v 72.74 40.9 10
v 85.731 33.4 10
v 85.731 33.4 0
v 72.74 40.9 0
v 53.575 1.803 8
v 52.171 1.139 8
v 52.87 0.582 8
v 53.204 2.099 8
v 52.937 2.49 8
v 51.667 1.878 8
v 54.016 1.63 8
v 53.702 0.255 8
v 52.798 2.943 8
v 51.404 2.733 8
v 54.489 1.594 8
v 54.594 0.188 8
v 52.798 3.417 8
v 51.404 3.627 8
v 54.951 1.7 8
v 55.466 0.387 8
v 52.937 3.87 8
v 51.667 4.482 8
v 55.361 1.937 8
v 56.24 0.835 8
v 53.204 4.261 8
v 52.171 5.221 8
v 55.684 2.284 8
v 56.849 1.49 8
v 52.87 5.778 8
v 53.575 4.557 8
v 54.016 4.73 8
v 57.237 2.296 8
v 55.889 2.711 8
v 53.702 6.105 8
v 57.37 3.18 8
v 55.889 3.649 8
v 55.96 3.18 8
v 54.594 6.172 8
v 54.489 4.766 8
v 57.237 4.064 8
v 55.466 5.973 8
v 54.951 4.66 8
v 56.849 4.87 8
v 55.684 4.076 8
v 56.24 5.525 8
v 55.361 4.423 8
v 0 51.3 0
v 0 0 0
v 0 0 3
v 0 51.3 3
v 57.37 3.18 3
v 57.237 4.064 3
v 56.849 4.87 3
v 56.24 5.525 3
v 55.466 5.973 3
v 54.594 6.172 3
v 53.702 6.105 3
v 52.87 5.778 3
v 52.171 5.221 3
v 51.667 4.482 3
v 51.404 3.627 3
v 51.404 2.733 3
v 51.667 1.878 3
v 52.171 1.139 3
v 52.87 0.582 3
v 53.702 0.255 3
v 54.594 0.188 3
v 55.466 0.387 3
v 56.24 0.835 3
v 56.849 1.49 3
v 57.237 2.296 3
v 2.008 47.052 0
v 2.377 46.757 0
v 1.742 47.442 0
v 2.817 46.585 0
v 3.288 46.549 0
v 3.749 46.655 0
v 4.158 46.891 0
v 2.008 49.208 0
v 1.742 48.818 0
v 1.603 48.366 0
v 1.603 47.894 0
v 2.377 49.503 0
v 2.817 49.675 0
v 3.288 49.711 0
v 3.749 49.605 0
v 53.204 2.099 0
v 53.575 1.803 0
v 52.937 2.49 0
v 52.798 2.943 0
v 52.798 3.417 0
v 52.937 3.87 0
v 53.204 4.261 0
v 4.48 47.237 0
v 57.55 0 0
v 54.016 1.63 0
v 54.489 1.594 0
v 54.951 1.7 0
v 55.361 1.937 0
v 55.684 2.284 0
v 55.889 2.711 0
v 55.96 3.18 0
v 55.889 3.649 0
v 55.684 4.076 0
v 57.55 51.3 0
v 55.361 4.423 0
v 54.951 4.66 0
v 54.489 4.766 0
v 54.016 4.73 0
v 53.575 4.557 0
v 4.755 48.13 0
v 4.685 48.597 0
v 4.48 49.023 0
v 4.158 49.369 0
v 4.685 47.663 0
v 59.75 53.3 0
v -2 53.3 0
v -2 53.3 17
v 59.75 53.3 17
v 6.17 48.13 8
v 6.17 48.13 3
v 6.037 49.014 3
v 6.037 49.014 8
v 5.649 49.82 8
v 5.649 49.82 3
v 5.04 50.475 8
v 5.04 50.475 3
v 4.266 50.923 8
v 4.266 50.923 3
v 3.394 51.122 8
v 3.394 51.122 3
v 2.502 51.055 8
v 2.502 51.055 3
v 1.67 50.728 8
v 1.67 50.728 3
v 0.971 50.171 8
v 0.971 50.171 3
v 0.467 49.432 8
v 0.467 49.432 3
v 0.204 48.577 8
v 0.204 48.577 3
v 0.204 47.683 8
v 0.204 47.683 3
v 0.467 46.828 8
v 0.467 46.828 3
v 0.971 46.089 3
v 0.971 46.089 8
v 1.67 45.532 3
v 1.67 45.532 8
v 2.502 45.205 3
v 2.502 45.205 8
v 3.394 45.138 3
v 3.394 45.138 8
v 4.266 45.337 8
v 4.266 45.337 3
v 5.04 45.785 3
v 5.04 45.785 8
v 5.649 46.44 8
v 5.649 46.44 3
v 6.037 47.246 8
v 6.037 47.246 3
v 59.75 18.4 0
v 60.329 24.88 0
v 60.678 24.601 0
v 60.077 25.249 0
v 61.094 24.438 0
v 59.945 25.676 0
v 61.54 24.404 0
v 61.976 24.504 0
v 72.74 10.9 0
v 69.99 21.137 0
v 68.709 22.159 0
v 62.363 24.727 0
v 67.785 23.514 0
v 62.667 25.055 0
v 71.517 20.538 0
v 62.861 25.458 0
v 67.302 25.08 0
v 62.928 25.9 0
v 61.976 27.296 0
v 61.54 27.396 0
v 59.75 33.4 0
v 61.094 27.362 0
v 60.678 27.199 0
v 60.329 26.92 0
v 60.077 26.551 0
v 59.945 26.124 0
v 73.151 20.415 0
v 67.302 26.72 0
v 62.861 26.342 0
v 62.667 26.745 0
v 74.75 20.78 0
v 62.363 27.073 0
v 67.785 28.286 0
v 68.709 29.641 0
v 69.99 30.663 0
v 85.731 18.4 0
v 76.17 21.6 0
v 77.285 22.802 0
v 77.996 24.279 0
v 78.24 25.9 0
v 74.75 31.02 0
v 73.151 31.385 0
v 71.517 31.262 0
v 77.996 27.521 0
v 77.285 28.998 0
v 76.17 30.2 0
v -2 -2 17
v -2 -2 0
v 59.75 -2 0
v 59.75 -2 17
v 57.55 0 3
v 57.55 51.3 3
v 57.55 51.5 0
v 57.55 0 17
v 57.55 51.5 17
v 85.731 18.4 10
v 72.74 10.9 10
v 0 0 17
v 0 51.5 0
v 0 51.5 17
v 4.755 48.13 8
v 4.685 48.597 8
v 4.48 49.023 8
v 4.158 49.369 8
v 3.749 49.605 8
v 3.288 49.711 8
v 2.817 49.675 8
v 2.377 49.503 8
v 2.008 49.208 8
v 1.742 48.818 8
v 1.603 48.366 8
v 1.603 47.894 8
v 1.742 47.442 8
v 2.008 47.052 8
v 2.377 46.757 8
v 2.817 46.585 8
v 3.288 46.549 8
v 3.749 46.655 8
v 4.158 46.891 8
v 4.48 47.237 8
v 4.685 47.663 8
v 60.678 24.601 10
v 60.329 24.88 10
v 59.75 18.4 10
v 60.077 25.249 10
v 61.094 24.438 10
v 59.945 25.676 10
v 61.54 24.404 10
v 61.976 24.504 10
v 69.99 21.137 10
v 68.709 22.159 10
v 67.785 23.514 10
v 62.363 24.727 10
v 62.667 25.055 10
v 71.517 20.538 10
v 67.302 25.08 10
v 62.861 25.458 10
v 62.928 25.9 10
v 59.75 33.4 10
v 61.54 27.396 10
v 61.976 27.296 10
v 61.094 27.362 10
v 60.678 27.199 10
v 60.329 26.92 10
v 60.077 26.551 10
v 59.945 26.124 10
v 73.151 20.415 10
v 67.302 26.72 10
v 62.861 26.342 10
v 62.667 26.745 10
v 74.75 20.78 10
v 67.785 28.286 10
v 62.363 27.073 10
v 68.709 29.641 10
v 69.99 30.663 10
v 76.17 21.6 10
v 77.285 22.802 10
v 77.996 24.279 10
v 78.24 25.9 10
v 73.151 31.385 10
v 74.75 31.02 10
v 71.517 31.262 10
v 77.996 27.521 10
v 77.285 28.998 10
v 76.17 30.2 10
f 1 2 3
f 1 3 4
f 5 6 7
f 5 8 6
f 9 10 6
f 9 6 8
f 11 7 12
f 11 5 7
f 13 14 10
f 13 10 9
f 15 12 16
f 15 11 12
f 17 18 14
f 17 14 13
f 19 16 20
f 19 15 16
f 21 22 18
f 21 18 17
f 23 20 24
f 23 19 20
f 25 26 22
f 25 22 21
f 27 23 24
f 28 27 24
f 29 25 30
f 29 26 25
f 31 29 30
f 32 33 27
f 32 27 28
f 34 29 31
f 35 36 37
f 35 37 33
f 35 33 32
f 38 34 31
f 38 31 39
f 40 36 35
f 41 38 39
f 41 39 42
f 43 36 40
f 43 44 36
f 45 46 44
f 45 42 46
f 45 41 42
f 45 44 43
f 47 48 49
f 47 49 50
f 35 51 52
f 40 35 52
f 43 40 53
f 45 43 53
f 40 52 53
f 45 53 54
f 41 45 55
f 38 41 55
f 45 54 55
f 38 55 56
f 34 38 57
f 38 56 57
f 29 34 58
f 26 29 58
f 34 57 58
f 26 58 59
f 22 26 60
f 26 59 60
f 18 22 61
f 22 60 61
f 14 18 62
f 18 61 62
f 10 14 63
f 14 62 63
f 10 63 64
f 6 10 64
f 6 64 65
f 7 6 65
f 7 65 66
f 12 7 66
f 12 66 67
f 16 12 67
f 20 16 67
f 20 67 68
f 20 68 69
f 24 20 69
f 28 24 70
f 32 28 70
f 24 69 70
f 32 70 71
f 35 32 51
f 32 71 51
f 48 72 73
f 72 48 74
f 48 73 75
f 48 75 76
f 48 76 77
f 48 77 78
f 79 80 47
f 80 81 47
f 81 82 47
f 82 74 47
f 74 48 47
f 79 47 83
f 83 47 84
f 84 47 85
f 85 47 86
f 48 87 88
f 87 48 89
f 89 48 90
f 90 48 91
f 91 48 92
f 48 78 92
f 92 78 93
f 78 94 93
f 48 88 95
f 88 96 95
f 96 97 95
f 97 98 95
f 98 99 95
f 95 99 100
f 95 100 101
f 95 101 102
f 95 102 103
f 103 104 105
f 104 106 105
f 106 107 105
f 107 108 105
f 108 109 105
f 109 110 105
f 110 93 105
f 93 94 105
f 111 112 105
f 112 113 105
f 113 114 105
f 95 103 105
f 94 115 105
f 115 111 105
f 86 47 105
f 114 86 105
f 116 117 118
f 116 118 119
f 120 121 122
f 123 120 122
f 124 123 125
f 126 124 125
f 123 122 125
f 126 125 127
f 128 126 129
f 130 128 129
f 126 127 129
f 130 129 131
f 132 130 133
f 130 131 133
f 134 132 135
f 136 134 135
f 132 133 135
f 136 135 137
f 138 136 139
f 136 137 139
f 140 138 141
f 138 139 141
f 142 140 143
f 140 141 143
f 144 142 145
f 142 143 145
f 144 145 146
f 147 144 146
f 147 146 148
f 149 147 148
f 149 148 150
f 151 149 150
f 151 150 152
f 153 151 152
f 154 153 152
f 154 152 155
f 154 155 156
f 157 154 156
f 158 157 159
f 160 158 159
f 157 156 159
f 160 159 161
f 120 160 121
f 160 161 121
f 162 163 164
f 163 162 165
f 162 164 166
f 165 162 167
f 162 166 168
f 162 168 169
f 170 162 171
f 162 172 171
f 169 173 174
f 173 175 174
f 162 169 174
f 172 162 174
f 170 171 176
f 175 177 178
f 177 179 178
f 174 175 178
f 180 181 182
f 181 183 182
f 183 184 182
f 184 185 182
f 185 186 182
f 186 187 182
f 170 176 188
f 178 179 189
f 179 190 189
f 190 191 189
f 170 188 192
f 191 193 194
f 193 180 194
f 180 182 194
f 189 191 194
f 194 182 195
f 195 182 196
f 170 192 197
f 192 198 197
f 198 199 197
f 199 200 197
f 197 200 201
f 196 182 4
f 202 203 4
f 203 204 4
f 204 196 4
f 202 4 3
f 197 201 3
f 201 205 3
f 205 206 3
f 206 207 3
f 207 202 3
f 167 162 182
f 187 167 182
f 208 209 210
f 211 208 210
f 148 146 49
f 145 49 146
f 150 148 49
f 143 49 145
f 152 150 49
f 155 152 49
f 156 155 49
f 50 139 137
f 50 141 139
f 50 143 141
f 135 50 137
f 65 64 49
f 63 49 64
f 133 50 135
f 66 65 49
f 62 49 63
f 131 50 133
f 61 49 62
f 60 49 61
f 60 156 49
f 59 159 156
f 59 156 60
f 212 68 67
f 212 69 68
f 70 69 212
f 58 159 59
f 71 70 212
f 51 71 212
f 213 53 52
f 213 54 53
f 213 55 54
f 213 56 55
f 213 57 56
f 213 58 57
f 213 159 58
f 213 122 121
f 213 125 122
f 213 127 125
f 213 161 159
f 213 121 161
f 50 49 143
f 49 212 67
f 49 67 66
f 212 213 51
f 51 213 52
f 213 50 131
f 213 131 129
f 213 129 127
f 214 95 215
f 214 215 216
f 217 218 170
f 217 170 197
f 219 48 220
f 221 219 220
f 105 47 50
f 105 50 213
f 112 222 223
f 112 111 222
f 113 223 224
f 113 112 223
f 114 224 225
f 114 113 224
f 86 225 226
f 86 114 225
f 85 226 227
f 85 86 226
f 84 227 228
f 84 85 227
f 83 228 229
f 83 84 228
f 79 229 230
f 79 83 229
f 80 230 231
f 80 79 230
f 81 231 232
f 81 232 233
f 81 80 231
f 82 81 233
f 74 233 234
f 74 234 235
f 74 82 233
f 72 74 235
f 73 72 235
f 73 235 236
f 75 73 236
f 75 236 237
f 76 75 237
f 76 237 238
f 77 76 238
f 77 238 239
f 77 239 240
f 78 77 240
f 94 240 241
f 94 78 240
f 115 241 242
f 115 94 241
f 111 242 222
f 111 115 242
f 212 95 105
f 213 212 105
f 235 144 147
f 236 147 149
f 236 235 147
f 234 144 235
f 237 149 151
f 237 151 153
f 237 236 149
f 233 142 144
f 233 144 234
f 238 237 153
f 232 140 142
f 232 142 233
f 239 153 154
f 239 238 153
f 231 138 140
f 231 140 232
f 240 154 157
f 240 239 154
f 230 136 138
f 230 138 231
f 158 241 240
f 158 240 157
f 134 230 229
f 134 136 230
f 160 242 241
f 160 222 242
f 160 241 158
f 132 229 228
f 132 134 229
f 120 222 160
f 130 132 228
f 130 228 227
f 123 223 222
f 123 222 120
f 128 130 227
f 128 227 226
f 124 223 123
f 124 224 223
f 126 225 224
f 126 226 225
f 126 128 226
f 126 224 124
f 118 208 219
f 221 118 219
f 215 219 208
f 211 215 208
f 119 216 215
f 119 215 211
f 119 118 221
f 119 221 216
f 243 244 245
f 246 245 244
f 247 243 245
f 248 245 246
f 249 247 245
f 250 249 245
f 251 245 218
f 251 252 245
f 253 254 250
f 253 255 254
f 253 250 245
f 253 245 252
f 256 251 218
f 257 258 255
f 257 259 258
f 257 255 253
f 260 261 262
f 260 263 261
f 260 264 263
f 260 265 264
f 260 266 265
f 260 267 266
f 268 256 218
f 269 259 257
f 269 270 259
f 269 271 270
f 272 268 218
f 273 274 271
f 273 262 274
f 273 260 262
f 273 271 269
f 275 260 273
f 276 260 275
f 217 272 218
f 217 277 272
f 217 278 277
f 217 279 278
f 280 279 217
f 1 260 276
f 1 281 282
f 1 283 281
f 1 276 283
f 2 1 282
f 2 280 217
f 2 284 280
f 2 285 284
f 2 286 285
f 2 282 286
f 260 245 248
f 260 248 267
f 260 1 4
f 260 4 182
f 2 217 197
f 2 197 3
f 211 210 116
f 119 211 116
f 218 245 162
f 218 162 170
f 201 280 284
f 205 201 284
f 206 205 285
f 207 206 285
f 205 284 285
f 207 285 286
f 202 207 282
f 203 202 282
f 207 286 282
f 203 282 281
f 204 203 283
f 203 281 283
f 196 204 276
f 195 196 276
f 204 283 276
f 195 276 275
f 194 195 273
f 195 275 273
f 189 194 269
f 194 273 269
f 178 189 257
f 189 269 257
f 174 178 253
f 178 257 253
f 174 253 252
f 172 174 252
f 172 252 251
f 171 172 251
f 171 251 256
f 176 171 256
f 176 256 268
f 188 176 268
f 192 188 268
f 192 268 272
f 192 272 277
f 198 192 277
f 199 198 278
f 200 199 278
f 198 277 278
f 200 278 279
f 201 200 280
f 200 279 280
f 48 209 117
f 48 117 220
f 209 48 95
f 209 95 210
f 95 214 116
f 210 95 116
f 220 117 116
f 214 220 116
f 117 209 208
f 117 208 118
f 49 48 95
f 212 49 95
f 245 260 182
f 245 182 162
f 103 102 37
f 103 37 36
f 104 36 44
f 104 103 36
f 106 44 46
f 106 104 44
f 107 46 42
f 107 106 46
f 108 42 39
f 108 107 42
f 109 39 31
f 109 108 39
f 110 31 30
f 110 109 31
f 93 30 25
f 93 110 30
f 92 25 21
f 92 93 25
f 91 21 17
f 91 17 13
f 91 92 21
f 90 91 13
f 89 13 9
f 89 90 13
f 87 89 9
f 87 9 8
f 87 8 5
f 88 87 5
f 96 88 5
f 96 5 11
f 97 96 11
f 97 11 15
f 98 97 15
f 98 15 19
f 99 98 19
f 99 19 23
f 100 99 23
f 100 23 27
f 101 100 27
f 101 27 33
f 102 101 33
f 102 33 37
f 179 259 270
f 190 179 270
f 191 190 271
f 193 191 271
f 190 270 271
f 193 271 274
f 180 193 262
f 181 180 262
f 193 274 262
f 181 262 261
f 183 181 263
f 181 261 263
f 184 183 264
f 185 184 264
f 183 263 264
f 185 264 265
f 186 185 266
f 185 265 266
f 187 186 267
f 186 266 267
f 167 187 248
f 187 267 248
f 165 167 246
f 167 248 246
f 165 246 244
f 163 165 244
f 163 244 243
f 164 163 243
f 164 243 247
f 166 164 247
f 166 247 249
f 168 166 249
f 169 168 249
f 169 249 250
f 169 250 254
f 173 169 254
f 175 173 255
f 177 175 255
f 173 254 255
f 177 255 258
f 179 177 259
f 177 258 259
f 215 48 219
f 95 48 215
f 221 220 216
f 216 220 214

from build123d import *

# Parameters (mm, degrees)
SKETCH001_W   = 61.75
SKETCH001_H   = 55.3
SKETCH001_W_2 = 57.55
SKETCH001_H_2 = 51.5
PAD001_DEPTH  = 17
SKETCH_W      = 57.55
SKETCH_H      = 51.3
SKETCH_R      = 1.59
SKETCH_R_2    = 1.585
PAD_DEPTH     = 3
SKETCH003_R   = 3
SKETCH003_R_2 = 1.585
SKETCH003_R_3 = 1.59
PAD005_DEPTH  = 5
SKETCH002_R   = 5.5
PAD004_DEPTH  = 10
SKETCH004_R   = 1.5
POCKET_DEPTH  = 10


with BuildPart() as pad001:
    # Sketch001 → Pad001 (new body)
    with BuildSketch(Plane.XY):
        with Locations((28.875, 25.65)):
            Rectangle(SKETCH001_W, SKETCH001_H)
        with Locations((28.775, 25.75)):
            Rectangle(SKETCH001_W_2, SKETCH001_H_2, mode=Mode.SUBTRACT)
    extrude(amount=PAD001_DEPTH)


with BuildPart() as pad005:
    # Sketch → Pad (new body)
    with BuildSketch(Plane.XY):
        with Locations((28.775, 25.65)):
            Rectangle(SKETCH_W, SKETCH_H)
        with Locations((54.37, 3.18)):
            Circle(SKETCH_R, mode=Mode.SUBTRACT)
        with Locations((3.17, 48.13)):
            Circle(SKETCH_R_2, mode=Mode.SUBTRACT)
    extrude(amount=PAD_DEPTH)

    # Sketch003 → Pad005 (new body)
    with BuildSketch(Plane.XY.offset(3)):
        with Locations((3.17, 48.13)):
            Circle(SKETCH003_R)
        with Locations((3.17, 48.13)):
            Circle(SKETCH003_R_2, mode=Mode.SUBTRACT)
        with Locations((54.37, 3.18)):
            Circle(SKETCH003_R)
        with Locations((54.37, 3.18)):
            Circle(SKETCH003_R_3, mode=Mode.SUBTRACT)
    extrude(amount=PAD005_DEPTH)


with BuildPart() as pocket:
    # Sketch002 → Pad004 (new body)
    with BuildSketch(Plane.XY.offset(10)):
        Polygon((85.730762, 33.4), (72.740381, 40.9), (59.75, 33.4), (59.75, 18.4), (72.740381, 10.9), (85.730762, 18.4), align=None)
        with Locations((72.740381, 25.9)):
            Circle(SKETCH002_R, mode=Mode.SUBTRACT)
    extrude(amount=-PAD004_DEPTH)

    # Sketch004 → Pocket (cut)
    with BuildSketch(Plane.XY.offset(10)):
        with Locations((61.42812, 25.9)):
            Circle(SKETCH004_R)
    extrude(amount=-POCKET_DEPTH, mode=Mode.SUBTRACT)


solid = Compound([pad001.part, pad005.part, pocket.part])
